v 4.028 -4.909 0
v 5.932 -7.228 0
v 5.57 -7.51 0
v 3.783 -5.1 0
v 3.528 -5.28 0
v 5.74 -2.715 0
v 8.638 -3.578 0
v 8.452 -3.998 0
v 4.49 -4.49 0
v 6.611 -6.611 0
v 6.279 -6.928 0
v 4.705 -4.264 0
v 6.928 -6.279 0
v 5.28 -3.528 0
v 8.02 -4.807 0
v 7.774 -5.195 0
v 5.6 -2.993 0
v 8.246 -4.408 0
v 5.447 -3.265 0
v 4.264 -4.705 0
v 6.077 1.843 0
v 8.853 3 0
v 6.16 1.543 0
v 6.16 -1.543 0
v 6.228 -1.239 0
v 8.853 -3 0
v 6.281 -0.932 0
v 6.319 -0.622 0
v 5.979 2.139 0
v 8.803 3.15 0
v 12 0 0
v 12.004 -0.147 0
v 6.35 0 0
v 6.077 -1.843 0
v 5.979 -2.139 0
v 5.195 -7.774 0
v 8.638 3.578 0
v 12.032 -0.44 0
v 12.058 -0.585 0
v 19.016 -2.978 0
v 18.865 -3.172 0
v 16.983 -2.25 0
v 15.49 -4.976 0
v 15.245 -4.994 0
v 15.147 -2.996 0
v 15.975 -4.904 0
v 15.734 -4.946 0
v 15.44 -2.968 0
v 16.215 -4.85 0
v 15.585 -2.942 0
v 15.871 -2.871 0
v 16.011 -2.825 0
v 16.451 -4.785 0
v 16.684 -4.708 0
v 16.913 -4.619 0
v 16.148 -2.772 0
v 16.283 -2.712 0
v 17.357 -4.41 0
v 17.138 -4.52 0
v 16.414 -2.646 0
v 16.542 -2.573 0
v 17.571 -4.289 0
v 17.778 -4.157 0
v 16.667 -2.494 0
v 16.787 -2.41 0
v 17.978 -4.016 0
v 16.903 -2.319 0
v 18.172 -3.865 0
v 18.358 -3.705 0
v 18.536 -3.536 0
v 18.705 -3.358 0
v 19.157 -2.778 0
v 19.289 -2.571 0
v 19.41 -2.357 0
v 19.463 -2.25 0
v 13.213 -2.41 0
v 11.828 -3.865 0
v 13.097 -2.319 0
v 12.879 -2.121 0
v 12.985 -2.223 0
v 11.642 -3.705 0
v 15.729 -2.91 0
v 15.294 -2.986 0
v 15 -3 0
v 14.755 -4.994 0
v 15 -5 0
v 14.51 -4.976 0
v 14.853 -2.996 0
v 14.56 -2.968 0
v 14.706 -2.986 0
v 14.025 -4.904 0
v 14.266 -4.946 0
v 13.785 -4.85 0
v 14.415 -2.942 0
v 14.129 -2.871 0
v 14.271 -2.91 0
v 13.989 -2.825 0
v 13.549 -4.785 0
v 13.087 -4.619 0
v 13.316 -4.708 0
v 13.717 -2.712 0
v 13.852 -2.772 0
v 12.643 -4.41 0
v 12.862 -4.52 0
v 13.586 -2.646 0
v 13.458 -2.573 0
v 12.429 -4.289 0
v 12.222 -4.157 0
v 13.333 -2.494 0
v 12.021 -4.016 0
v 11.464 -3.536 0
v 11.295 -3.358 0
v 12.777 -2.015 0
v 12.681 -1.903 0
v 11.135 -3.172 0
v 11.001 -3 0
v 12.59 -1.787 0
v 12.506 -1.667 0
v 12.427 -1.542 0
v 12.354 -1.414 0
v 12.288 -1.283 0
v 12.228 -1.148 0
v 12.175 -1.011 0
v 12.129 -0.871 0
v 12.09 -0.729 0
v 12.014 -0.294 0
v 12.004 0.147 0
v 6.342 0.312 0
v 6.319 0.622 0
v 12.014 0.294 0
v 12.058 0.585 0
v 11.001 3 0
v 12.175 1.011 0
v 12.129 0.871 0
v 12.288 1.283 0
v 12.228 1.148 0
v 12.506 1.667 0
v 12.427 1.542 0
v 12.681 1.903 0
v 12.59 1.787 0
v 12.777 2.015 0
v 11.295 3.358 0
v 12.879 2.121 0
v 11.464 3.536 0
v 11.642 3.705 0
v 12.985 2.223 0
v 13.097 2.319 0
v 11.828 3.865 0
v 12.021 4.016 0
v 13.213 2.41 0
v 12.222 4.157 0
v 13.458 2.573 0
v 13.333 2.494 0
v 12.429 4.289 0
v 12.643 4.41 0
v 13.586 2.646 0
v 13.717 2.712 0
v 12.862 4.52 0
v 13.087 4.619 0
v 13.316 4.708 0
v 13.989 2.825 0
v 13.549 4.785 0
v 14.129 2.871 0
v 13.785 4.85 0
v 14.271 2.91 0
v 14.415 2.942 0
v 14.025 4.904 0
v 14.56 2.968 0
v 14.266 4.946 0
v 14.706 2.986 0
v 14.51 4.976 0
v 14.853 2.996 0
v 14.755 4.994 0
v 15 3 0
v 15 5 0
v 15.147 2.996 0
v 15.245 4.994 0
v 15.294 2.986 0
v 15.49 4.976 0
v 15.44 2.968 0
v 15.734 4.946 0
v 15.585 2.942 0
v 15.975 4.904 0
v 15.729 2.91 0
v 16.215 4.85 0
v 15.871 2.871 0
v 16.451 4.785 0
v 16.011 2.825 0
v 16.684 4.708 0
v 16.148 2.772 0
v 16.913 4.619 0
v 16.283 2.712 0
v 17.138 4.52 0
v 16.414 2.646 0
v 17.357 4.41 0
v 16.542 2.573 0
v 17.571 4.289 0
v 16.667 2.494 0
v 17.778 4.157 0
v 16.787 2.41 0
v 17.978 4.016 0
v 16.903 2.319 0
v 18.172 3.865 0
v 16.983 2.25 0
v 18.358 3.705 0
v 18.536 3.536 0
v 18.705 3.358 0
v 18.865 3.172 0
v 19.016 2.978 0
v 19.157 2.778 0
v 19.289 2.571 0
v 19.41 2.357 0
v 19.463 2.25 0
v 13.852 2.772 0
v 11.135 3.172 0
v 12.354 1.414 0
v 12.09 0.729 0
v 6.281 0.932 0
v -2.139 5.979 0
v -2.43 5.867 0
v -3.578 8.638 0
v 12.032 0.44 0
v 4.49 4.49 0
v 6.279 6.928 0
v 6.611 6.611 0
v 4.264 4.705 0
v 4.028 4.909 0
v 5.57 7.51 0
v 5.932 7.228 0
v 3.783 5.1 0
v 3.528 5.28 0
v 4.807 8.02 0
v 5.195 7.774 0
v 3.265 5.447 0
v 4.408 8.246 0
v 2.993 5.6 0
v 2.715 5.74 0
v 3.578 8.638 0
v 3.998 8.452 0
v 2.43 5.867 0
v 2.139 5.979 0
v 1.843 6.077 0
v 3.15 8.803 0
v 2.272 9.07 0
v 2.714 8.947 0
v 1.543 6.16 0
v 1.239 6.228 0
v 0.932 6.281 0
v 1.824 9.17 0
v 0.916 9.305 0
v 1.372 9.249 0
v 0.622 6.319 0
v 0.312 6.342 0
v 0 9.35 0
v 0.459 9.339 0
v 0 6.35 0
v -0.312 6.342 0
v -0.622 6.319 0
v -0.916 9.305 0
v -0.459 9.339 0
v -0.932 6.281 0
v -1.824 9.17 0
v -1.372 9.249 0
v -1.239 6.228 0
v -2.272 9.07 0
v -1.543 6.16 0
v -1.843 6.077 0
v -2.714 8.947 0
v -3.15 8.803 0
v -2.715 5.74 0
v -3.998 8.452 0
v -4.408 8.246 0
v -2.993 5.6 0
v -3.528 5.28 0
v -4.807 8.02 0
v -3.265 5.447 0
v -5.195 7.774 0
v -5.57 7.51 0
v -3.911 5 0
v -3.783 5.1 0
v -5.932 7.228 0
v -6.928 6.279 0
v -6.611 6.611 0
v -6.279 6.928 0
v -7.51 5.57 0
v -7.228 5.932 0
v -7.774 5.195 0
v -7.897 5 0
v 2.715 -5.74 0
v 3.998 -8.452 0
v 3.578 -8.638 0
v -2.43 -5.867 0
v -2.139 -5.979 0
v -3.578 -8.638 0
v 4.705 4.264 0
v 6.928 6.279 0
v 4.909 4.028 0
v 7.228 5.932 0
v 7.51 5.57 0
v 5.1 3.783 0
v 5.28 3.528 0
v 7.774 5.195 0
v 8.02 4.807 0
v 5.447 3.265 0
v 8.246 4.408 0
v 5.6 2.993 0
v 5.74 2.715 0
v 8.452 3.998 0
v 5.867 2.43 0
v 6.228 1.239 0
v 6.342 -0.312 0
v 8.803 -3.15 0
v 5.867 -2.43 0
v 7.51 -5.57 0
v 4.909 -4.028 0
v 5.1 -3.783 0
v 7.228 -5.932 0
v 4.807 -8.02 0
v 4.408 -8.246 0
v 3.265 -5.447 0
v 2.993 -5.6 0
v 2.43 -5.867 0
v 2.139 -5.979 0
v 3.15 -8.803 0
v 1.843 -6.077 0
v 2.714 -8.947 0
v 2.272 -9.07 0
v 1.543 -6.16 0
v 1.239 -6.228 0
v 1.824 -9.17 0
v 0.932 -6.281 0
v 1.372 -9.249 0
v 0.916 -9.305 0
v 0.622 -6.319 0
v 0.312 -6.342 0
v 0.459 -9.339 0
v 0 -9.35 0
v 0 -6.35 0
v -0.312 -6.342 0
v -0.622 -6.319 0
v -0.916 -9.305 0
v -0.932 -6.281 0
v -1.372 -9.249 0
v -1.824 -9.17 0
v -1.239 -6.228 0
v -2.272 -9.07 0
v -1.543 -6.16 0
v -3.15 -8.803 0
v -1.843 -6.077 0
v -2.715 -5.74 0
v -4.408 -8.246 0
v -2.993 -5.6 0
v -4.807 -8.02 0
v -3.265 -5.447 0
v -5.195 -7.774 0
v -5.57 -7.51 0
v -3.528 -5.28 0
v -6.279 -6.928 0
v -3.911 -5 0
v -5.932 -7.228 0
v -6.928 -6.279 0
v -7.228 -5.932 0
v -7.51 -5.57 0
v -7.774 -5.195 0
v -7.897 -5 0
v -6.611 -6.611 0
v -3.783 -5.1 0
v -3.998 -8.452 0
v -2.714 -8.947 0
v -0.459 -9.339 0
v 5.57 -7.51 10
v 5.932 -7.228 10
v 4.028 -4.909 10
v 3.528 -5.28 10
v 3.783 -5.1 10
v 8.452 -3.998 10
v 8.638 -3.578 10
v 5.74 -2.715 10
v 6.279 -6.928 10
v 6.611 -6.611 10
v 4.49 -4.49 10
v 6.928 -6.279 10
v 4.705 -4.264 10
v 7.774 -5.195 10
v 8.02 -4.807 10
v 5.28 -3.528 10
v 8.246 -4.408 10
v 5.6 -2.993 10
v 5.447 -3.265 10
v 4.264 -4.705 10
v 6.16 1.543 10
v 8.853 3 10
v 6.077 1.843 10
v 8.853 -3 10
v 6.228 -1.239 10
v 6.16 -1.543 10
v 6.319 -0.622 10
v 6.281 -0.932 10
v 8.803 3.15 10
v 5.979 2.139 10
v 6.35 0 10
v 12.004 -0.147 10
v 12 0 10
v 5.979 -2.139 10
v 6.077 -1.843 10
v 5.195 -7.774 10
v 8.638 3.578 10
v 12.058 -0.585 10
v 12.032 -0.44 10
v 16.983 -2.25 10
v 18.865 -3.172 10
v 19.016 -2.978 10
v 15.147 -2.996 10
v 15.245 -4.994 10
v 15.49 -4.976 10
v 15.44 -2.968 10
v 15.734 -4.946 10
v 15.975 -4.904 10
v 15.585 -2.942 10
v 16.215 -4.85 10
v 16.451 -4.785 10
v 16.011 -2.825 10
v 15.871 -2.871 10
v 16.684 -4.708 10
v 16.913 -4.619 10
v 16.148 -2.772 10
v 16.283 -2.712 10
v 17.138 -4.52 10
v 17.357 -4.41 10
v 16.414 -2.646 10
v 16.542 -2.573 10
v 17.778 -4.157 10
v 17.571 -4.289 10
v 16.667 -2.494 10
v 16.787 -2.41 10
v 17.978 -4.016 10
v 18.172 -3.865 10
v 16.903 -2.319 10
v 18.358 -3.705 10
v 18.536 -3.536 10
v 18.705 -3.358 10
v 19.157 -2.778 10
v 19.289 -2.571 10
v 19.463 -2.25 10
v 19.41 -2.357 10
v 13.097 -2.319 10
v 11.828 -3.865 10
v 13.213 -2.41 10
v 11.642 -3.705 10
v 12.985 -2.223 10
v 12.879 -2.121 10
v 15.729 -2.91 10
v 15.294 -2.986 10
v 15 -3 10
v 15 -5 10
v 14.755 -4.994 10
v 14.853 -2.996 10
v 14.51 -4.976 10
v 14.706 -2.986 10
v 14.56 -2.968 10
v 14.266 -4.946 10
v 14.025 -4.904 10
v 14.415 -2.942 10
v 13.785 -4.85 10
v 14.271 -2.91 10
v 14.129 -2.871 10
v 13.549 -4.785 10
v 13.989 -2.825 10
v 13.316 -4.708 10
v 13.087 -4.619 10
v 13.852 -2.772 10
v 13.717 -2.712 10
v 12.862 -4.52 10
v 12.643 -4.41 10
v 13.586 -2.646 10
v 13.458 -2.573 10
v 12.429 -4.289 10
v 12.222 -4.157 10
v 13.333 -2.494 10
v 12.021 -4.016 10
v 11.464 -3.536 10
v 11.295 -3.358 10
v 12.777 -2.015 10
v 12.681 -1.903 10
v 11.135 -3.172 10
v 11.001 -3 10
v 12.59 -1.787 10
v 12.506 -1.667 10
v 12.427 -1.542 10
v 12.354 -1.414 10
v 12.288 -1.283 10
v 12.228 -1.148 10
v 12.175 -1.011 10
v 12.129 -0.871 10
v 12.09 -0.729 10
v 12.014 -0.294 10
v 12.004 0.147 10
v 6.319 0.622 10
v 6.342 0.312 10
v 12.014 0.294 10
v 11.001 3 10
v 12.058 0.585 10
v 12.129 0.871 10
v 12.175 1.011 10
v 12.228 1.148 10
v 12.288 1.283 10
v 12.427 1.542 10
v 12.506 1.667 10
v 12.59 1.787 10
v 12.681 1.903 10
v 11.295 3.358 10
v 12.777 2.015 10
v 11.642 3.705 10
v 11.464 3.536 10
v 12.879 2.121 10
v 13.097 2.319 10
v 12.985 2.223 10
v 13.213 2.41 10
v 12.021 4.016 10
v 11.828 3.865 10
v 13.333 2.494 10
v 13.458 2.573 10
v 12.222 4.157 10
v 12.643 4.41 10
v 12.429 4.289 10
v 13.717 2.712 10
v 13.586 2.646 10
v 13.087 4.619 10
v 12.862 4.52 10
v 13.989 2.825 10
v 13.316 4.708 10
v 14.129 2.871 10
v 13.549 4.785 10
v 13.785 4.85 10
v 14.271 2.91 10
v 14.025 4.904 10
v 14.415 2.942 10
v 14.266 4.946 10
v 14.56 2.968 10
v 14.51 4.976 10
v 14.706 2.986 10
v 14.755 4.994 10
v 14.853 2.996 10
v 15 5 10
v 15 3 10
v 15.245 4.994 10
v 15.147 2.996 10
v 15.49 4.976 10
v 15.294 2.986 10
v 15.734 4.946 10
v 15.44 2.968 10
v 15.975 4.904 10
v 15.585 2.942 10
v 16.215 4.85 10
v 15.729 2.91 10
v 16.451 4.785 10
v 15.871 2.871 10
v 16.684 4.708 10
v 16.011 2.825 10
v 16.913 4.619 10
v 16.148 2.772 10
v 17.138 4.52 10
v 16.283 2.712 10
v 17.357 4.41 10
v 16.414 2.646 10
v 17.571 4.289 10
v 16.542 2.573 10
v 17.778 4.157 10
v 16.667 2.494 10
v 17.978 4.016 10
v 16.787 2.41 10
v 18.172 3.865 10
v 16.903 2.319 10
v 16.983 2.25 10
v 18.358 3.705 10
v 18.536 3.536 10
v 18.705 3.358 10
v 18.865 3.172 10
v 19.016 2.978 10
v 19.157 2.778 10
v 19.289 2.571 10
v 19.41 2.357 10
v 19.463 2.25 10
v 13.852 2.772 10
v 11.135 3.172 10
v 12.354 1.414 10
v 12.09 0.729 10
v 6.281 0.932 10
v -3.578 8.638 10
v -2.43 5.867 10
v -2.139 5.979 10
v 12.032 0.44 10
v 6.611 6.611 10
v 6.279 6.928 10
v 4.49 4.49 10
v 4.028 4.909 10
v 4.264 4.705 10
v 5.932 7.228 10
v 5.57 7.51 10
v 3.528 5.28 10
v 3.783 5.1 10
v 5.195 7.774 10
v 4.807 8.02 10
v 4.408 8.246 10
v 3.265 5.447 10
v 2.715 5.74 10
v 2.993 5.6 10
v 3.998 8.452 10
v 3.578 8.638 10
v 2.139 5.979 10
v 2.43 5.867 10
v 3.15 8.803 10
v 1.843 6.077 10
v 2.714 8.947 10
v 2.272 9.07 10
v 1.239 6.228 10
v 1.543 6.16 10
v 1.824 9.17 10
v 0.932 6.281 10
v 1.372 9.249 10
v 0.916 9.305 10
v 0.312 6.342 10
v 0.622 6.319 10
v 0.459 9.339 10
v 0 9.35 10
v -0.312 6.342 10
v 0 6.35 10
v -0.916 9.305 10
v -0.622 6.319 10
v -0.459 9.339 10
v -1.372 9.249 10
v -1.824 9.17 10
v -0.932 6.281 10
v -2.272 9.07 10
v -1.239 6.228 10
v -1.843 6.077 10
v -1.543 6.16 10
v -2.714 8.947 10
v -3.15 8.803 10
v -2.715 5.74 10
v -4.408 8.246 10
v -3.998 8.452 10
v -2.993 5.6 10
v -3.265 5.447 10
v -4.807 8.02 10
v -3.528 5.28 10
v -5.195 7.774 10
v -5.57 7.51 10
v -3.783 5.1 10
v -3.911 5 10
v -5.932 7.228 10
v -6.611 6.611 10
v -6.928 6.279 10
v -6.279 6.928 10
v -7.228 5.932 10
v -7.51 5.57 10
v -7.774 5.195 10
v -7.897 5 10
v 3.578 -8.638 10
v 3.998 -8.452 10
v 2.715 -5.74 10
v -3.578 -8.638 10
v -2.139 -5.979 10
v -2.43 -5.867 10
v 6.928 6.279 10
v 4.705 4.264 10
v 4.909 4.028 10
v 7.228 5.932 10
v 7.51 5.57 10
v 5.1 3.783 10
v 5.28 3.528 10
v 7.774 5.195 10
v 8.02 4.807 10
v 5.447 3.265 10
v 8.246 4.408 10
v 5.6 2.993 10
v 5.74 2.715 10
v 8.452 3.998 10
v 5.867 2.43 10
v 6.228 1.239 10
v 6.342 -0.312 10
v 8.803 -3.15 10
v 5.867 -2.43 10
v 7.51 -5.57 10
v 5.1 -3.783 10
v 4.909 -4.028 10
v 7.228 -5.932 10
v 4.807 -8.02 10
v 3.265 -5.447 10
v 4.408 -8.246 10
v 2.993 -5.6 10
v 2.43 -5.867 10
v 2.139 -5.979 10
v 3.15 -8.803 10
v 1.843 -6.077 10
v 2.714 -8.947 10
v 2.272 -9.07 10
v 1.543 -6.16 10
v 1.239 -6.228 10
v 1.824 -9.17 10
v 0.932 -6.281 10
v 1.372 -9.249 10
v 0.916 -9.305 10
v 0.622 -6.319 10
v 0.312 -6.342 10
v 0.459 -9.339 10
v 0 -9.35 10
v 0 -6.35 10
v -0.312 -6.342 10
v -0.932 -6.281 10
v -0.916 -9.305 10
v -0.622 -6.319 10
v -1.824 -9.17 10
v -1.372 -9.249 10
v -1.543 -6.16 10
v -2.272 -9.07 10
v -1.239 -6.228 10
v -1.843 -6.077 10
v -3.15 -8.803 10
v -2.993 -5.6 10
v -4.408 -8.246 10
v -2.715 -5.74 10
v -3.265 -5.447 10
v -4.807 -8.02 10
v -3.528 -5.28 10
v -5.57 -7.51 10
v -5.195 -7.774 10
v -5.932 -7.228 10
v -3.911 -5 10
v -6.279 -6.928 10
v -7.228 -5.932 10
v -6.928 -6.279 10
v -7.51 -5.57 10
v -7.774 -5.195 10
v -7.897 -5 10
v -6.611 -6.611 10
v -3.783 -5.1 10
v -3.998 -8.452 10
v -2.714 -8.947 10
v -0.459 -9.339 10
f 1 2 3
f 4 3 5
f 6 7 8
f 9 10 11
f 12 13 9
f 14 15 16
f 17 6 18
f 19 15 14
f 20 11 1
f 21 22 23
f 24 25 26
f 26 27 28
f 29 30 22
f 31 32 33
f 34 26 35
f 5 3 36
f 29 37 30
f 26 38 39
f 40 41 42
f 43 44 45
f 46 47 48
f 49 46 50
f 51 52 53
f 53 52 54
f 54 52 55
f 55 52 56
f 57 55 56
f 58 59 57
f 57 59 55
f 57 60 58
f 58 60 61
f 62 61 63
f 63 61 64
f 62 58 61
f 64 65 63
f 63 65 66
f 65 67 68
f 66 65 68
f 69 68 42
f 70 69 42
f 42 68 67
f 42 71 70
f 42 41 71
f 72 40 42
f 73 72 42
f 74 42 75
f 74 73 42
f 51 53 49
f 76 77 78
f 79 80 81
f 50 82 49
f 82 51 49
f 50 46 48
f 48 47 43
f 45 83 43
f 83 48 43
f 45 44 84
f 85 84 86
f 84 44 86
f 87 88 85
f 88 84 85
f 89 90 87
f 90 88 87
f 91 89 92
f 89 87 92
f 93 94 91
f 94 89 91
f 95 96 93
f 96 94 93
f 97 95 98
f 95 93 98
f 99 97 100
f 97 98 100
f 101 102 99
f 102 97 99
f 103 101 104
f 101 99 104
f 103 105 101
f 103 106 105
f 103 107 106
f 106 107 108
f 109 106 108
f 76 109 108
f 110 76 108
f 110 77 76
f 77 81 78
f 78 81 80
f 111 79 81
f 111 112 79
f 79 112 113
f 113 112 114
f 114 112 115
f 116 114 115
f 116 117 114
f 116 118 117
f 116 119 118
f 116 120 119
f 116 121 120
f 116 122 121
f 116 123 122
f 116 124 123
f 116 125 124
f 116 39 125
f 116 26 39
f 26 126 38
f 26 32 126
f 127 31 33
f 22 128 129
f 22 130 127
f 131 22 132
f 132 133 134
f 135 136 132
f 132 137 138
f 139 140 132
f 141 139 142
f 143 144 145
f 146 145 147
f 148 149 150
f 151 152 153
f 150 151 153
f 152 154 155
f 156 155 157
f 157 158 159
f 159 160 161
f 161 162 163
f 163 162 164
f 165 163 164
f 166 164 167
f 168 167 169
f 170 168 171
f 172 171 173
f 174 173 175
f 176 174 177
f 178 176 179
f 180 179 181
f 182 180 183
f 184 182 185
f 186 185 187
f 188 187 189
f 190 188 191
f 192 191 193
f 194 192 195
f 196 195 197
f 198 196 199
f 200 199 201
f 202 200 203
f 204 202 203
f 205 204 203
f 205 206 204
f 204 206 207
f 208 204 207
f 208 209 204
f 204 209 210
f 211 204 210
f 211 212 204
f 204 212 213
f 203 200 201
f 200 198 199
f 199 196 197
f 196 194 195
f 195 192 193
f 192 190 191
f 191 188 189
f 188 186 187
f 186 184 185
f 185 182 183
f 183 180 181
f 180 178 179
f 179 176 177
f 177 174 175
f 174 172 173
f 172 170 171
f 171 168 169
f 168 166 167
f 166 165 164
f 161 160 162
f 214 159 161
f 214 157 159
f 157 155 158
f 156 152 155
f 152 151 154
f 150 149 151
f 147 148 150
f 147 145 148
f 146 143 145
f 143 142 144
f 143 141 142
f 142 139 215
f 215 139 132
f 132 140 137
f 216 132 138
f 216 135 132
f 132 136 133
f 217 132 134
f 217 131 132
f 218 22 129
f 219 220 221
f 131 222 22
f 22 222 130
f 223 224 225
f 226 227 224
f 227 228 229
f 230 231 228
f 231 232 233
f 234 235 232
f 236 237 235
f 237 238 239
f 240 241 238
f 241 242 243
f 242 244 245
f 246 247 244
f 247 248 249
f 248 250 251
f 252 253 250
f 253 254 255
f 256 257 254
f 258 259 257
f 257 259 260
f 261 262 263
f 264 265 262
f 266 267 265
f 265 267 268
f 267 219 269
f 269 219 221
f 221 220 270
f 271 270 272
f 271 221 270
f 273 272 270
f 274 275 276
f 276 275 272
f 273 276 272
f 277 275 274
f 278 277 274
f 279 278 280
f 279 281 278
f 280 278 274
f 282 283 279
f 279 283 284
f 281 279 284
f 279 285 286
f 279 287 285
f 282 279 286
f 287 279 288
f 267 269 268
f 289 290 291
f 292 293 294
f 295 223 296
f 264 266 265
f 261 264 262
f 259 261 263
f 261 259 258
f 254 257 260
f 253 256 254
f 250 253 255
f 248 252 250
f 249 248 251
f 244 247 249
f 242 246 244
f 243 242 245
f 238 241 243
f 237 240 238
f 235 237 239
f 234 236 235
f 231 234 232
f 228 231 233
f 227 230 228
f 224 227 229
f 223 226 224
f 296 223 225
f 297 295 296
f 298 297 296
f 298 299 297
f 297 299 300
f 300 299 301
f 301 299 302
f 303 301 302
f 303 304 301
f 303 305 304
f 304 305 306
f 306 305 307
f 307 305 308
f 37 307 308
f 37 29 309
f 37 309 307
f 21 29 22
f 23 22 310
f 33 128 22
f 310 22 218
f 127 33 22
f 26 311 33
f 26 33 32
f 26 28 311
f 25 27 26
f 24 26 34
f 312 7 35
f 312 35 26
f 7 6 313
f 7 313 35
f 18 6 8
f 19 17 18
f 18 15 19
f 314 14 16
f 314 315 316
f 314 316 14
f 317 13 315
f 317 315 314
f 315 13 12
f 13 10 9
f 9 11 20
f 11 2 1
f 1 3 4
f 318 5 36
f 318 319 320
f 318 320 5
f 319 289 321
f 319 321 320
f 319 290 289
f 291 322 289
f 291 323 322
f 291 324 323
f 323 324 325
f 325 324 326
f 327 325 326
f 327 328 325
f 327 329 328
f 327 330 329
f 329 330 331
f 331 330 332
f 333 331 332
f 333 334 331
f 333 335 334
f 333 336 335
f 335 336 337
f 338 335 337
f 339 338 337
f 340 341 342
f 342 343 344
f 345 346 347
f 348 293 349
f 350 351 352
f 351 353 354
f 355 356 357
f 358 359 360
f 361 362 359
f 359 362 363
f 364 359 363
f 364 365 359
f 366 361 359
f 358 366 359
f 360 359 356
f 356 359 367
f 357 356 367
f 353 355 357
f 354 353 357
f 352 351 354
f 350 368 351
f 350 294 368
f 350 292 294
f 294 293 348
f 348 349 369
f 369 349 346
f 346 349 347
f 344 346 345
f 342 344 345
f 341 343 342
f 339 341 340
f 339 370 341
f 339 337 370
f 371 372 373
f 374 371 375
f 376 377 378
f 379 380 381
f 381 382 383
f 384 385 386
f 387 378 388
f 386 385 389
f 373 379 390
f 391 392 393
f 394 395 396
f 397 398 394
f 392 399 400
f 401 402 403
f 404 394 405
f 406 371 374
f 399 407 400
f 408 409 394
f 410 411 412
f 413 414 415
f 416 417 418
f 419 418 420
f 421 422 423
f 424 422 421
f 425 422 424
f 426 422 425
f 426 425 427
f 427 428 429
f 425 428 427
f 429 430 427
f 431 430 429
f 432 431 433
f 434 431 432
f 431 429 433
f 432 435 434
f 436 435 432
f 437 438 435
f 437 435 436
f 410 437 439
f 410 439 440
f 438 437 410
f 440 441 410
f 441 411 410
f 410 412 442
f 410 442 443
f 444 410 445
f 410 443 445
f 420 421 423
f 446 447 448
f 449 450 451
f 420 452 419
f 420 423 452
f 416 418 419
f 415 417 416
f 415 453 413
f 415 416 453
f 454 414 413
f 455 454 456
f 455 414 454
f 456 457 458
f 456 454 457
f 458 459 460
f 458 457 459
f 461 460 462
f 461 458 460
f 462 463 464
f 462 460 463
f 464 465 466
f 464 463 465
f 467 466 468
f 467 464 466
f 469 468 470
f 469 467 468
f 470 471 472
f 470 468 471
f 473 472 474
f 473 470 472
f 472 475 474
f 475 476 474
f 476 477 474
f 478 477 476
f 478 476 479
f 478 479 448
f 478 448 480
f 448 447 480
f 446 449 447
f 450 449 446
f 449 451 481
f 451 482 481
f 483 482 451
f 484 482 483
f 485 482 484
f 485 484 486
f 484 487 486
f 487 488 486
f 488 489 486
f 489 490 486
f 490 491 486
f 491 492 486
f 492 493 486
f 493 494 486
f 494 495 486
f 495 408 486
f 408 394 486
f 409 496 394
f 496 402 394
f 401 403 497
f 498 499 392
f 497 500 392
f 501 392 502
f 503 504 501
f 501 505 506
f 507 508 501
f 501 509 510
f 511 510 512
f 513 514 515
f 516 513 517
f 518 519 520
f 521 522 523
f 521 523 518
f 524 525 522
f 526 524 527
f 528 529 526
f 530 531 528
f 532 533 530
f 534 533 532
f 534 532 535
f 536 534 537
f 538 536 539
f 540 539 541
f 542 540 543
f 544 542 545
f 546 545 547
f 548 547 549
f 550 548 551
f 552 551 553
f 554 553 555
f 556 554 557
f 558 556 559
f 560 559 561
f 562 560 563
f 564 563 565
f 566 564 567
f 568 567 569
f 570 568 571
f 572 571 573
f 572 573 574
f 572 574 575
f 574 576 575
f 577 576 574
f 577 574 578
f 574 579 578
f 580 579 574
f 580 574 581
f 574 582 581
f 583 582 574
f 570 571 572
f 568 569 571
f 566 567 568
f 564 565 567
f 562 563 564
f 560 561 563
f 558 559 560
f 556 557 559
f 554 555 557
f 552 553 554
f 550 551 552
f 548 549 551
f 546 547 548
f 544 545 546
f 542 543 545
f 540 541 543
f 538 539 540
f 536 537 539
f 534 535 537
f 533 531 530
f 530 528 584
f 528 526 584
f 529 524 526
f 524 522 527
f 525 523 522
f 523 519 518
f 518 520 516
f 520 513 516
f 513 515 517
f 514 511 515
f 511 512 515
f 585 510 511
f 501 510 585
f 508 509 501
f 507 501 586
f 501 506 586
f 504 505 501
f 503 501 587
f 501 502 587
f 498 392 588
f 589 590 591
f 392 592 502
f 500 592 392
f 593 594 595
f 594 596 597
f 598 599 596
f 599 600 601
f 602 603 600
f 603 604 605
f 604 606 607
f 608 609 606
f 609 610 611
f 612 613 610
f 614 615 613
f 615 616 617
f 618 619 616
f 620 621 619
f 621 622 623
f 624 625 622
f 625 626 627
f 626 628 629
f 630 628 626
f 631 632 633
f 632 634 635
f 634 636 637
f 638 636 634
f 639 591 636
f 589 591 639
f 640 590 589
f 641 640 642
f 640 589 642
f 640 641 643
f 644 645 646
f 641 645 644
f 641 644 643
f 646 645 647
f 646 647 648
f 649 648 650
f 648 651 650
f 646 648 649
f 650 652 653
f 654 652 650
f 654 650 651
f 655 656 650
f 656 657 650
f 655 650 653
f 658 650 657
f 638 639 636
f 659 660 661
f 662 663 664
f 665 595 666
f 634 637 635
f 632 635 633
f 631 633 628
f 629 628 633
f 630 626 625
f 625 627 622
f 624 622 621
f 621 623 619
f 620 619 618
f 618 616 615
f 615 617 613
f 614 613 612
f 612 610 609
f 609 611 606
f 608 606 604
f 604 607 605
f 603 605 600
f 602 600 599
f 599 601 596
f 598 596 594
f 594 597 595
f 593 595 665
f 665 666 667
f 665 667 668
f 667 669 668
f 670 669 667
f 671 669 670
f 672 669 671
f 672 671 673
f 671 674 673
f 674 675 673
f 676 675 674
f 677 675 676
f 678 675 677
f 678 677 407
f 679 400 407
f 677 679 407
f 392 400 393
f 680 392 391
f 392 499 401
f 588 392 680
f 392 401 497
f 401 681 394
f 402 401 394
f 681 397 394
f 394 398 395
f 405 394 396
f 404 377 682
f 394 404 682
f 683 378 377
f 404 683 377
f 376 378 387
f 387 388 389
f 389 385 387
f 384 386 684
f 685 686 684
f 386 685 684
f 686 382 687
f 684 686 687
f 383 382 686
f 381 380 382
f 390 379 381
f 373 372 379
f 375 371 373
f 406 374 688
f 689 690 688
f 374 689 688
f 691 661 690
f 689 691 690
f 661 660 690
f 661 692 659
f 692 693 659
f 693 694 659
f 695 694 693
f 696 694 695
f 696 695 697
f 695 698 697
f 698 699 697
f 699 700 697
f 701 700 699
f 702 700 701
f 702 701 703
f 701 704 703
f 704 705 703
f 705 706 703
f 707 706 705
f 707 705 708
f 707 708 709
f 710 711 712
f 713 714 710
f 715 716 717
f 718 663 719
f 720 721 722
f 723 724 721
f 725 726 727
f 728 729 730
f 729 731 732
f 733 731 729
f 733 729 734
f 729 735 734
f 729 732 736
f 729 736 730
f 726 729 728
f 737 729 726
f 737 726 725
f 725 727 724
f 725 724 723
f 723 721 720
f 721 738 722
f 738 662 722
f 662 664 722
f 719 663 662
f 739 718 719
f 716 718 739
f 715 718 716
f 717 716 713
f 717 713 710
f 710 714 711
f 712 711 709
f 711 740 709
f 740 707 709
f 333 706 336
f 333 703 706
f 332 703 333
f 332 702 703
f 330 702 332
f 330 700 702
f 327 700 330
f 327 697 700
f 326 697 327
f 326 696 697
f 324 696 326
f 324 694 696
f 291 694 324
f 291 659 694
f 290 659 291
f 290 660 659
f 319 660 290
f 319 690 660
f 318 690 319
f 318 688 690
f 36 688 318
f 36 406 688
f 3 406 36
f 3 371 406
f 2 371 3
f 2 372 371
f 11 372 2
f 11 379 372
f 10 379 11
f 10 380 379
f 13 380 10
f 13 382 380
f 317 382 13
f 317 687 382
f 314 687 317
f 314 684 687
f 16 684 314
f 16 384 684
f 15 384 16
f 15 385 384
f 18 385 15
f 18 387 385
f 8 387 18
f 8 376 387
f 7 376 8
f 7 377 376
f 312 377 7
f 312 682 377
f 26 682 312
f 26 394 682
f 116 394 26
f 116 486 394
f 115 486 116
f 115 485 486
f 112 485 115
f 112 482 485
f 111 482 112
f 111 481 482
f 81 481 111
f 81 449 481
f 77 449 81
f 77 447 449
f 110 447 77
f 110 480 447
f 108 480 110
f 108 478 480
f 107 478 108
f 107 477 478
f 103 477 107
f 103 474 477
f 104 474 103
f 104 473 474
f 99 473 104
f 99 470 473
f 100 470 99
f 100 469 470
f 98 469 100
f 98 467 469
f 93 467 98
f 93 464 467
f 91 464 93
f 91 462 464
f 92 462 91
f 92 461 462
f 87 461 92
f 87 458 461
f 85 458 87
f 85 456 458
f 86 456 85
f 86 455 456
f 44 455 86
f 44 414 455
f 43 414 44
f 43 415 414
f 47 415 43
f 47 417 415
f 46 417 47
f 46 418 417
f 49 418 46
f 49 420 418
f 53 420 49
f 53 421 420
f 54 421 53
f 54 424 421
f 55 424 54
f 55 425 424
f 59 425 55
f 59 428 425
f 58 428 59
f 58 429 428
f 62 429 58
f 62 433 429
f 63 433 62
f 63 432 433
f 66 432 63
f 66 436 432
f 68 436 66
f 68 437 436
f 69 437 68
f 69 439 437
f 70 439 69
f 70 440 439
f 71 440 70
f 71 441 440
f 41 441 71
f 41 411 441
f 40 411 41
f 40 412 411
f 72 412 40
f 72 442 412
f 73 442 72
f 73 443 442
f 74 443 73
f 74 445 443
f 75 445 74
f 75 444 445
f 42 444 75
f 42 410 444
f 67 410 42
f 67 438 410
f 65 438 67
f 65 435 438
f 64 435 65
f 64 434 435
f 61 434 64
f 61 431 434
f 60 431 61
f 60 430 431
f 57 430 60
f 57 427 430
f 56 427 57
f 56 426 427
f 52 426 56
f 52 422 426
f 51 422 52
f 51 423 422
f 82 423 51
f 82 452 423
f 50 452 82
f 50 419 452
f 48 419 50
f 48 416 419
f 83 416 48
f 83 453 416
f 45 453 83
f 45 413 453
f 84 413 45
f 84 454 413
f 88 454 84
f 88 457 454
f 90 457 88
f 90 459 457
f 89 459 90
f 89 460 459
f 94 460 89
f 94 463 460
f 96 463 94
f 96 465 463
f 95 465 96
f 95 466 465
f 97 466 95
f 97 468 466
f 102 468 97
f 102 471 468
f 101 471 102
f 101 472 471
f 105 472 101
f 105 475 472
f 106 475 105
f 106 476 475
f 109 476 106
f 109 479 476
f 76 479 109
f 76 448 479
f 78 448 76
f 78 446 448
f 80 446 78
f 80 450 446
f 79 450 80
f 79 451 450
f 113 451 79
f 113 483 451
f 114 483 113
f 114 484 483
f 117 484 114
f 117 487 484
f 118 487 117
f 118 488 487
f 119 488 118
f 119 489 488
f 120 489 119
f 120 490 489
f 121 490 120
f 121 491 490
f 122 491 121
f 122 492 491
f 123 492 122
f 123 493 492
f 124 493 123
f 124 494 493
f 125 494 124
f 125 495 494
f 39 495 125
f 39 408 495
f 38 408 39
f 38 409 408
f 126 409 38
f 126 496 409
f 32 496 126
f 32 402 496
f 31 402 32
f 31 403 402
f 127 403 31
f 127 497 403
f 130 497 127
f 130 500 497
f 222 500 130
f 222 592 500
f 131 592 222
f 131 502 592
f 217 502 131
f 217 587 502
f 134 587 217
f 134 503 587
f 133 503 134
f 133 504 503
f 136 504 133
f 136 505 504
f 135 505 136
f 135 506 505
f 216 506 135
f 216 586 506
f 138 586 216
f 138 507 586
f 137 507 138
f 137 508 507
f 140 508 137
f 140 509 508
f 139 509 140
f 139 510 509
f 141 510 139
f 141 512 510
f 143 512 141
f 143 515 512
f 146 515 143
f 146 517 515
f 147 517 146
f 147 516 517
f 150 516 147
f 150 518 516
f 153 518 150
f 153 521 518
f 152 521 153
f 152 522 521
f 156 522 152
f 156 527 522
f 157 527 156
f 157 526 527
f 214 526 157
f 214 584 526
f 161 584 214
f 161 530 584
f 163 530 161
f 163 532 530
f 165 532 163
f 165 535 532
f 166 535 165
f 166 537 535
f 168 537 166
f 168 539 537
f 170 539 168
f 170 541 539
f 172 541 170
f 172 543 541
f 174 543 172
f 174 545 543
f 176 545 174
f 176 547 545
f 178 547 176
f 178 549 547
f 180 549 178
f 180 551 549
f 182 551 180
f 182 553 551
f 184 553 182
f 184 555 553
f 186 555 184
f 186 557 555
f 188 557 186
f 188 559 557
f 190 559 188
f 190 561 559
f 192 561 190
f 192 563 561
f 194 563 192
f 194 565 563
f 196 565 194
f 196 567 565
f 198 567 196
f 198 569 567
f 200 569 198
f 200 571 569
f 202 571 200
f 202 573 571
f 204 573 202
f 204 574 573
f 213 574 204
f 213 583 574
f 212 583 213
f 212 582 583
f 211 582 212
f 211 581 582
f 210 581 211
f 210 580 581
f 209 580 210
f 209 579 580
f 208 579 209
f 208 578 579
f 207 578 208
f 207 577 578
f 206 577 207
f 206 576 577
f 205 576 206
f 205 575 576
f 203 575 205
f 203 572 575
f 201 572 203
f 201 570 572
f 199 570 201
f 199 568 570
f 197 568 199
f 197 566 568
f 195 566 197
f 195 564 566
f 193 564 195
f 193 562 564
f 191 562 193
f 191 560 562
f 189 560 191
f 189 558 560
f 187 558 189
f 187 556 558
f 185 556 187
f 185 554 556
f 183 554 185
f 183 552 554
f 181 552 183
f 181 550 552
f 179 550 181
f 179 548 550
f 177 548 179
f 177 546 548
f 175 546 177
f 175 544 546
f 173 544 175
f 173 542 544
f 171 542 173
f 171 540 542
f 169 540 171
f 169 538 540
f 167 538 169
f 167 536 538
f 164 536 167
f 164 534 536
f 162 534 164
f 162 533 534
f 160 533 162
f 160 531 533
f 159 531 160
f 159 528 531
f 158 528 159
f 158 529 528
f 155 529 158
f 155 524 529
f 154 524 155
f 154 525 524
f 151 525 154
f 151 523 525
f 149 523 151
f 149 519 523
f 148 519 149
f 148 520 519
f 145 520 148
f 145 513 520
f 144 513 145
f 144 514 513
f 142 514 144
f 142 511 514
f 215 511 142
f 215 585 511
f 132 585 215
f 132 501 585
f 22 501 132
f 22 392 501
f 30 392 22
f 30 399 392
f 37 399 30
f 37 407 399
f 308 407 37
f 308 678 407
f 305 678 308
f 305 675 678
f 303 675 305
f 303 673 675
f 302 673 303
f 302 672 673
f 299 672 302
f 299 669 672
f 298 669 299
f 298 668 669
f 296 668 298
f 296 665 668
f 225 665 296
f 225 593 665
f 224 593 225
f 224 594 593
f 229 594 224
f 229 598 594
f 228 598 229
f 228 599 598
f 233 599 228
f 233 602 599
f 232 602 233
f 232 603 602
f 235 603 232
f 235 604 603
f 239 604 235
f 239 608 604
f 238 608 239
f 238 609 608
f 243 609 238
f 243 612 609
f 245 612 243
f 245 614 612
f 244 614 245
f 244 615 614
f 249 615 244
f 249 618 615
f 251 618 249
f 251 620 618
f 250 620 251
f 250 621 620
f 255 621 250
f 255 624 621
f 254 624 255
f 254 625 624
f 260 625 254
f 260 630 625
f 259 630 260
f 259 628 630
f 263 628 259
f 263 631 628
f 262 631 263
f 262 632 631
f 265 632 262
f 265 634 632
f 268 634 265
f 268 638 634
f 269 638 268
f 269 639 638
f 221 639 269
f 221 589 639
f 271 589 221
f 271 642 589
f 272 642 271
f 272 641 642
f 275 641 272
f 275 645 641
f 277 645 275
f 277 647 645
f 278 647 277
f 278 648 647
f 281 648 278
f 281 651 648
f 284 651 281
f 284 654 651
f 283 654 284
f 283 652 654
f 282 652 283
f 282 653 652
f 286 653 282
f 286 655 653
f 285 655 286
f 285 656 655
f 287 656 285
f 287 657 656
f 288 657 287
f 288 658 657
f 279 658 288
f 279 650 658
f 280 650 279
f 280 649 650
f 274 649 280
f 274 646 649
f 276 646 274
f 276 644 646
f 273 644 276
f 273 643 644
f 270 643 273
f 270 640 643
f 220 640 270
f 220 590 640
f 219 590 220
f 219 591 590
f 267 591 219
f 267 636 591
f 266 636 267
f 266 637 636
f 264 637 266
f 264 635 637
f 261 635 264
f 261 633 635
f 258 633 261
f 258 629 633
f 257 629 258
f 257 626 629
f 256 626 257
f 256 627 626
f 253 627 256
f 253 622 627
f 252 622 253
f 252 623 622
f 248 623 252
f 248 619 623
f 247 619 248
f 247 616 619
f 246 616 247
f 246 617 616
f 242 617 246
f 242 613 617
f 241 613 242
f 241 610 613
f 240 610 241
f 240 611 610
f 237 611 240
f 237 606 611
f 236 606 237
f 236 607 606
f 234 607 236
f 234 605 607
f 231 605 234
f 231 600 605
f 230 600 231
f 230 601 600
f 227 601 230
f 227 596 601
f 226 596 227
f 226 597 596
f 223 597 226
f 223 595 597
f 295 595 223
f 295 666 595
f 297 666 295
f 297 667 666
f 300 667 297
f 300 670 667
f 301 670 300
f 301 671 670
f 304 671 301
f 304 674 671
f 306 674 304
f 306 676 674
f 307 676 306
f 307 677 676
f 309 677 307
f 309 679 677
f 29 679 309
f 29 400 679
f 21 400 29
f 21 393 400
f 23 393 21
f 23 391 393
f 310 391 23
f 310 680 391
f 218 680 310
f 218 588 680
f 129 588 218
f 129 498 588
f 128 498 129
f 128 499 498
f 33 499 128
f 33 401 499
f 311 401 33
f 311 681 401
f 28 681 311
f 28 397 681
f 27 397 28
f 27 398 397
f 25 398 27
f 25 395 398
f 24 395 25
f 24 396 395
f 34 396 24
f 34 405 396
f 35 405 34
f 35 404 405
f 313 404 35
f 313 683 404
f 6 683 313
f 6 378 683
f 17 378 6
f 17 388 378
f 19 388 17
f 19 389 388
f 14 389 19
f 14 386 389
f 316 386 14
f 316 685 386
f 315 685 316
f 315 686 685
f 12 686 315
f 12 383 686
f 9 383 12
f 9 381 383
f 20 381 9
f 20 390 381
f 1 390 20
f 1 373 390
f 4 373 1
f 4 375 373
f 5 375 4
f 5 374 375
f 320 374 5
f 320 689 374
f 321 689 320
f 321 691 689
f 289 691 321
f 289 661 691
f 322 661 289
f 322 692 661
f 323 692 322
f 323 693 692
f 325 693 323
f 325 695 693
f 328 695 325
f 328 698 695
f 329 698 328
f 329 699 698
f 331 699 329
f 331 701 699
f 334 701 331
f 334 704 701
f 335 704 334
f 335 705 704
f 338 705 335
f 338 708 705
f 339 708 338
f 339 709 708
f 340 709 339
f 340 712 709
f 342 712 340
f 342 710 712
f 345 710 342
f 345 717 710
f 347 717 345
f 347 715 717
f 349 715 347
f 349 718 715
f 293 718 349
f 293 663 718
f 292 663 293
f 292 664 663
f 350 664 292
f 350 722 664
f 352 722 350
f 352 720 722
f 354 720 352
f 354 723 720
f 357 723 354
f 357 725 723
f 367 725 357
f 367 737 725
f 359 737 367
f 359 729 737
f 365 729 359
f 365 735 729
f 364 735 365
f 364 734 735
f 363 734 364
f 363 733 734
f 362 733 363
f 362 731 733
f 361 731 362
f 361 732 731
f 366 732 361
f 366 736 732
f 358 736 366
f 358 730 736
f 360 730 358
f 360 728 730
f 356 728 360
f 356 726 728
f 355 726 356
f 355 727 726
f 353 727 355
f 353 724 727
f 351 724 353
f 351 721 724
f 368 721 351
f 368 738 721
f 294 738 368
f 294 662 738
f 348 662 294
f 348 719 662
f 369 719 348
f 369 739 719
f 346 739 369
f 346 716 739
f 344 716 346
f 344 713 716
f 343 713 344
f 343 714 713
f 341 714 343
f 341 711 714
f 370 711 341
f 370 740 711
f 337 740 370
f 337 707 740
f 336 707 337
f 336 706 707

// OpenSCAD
// ---------- Parameters ----------
inner_d_rod = 12.7;          // inner diameter of the rod ring (mm)
wall_rod = 3;                // wall thickness of the rod ring (mm)
outer_d_rod = inner_d_rod + 2*wall_rod; // outer diameter of the rod ring (mm)

inner_d_tube = 6;            // inner diameter of the tubing ring (mm)
wall_tube = 2;               // wall thickness of the tubing ring (mm)
outer_d_tube = inner_d_tube + 2*wall_tube; // outer diameter of the tubing ring (mm)

height = 10;                 // extrusion height (mm)

rod_opening_width = 10;      // y‑range of the rod opening (mm)
tube_opening_width = 4.5;    // y‑range of the tube opening (mm)

bridge_x_start = 8;          // left x edge of the bridge (mm)
bridge_x_end   = 12;         // right x edge of the bridge (mm)
bridge_y_width = 6;          // total y width of the bridge (mm)

cut_extra = 1;               // extra length for cutting shapes (mm)

// ---------- $fn for smooth curves ----------
$fn = 128;

// ---------- 2‑D profile modules ----------
module rod_ring_2d() {
    difference() {
        // outer circle
        circle(d = outer_d_rod);
        // inner hole
        circle(d = inner_d_rod);
        // opening cut on the -X side
        translate([-100 - cut_extra, -rod_opening_width/2])
            square([100 + cut_extra, rod_opening_width]);
    }
}

module tube_ring_2d() {
    difference() {
        // outer circle (centered at (15,0))
        translate([15,0]) circle(d = outer_d_tube);
        // inner hole
        translate([15,0]) circle(d = inner_d_tube);
        // opening cut on the +X side
        translate([15 + cut_extra, -tube_opening_width/2])
            square([100 + cut_extra, tube_opening_width]);
    }
}

module bridge_2d() {
    // solid bridge between the two rings
    translate([bridge_x_start, -bridge_y_width/2])
        square([bridge_x_end - bridge_x_start, bridge_y_width]);
}

// ---------- Main model ----------
linear_extrude(height = height) {
    union() {
        rod_ring_2d();
        tube_ring_2d();
        bridge_2d();
    }
}
